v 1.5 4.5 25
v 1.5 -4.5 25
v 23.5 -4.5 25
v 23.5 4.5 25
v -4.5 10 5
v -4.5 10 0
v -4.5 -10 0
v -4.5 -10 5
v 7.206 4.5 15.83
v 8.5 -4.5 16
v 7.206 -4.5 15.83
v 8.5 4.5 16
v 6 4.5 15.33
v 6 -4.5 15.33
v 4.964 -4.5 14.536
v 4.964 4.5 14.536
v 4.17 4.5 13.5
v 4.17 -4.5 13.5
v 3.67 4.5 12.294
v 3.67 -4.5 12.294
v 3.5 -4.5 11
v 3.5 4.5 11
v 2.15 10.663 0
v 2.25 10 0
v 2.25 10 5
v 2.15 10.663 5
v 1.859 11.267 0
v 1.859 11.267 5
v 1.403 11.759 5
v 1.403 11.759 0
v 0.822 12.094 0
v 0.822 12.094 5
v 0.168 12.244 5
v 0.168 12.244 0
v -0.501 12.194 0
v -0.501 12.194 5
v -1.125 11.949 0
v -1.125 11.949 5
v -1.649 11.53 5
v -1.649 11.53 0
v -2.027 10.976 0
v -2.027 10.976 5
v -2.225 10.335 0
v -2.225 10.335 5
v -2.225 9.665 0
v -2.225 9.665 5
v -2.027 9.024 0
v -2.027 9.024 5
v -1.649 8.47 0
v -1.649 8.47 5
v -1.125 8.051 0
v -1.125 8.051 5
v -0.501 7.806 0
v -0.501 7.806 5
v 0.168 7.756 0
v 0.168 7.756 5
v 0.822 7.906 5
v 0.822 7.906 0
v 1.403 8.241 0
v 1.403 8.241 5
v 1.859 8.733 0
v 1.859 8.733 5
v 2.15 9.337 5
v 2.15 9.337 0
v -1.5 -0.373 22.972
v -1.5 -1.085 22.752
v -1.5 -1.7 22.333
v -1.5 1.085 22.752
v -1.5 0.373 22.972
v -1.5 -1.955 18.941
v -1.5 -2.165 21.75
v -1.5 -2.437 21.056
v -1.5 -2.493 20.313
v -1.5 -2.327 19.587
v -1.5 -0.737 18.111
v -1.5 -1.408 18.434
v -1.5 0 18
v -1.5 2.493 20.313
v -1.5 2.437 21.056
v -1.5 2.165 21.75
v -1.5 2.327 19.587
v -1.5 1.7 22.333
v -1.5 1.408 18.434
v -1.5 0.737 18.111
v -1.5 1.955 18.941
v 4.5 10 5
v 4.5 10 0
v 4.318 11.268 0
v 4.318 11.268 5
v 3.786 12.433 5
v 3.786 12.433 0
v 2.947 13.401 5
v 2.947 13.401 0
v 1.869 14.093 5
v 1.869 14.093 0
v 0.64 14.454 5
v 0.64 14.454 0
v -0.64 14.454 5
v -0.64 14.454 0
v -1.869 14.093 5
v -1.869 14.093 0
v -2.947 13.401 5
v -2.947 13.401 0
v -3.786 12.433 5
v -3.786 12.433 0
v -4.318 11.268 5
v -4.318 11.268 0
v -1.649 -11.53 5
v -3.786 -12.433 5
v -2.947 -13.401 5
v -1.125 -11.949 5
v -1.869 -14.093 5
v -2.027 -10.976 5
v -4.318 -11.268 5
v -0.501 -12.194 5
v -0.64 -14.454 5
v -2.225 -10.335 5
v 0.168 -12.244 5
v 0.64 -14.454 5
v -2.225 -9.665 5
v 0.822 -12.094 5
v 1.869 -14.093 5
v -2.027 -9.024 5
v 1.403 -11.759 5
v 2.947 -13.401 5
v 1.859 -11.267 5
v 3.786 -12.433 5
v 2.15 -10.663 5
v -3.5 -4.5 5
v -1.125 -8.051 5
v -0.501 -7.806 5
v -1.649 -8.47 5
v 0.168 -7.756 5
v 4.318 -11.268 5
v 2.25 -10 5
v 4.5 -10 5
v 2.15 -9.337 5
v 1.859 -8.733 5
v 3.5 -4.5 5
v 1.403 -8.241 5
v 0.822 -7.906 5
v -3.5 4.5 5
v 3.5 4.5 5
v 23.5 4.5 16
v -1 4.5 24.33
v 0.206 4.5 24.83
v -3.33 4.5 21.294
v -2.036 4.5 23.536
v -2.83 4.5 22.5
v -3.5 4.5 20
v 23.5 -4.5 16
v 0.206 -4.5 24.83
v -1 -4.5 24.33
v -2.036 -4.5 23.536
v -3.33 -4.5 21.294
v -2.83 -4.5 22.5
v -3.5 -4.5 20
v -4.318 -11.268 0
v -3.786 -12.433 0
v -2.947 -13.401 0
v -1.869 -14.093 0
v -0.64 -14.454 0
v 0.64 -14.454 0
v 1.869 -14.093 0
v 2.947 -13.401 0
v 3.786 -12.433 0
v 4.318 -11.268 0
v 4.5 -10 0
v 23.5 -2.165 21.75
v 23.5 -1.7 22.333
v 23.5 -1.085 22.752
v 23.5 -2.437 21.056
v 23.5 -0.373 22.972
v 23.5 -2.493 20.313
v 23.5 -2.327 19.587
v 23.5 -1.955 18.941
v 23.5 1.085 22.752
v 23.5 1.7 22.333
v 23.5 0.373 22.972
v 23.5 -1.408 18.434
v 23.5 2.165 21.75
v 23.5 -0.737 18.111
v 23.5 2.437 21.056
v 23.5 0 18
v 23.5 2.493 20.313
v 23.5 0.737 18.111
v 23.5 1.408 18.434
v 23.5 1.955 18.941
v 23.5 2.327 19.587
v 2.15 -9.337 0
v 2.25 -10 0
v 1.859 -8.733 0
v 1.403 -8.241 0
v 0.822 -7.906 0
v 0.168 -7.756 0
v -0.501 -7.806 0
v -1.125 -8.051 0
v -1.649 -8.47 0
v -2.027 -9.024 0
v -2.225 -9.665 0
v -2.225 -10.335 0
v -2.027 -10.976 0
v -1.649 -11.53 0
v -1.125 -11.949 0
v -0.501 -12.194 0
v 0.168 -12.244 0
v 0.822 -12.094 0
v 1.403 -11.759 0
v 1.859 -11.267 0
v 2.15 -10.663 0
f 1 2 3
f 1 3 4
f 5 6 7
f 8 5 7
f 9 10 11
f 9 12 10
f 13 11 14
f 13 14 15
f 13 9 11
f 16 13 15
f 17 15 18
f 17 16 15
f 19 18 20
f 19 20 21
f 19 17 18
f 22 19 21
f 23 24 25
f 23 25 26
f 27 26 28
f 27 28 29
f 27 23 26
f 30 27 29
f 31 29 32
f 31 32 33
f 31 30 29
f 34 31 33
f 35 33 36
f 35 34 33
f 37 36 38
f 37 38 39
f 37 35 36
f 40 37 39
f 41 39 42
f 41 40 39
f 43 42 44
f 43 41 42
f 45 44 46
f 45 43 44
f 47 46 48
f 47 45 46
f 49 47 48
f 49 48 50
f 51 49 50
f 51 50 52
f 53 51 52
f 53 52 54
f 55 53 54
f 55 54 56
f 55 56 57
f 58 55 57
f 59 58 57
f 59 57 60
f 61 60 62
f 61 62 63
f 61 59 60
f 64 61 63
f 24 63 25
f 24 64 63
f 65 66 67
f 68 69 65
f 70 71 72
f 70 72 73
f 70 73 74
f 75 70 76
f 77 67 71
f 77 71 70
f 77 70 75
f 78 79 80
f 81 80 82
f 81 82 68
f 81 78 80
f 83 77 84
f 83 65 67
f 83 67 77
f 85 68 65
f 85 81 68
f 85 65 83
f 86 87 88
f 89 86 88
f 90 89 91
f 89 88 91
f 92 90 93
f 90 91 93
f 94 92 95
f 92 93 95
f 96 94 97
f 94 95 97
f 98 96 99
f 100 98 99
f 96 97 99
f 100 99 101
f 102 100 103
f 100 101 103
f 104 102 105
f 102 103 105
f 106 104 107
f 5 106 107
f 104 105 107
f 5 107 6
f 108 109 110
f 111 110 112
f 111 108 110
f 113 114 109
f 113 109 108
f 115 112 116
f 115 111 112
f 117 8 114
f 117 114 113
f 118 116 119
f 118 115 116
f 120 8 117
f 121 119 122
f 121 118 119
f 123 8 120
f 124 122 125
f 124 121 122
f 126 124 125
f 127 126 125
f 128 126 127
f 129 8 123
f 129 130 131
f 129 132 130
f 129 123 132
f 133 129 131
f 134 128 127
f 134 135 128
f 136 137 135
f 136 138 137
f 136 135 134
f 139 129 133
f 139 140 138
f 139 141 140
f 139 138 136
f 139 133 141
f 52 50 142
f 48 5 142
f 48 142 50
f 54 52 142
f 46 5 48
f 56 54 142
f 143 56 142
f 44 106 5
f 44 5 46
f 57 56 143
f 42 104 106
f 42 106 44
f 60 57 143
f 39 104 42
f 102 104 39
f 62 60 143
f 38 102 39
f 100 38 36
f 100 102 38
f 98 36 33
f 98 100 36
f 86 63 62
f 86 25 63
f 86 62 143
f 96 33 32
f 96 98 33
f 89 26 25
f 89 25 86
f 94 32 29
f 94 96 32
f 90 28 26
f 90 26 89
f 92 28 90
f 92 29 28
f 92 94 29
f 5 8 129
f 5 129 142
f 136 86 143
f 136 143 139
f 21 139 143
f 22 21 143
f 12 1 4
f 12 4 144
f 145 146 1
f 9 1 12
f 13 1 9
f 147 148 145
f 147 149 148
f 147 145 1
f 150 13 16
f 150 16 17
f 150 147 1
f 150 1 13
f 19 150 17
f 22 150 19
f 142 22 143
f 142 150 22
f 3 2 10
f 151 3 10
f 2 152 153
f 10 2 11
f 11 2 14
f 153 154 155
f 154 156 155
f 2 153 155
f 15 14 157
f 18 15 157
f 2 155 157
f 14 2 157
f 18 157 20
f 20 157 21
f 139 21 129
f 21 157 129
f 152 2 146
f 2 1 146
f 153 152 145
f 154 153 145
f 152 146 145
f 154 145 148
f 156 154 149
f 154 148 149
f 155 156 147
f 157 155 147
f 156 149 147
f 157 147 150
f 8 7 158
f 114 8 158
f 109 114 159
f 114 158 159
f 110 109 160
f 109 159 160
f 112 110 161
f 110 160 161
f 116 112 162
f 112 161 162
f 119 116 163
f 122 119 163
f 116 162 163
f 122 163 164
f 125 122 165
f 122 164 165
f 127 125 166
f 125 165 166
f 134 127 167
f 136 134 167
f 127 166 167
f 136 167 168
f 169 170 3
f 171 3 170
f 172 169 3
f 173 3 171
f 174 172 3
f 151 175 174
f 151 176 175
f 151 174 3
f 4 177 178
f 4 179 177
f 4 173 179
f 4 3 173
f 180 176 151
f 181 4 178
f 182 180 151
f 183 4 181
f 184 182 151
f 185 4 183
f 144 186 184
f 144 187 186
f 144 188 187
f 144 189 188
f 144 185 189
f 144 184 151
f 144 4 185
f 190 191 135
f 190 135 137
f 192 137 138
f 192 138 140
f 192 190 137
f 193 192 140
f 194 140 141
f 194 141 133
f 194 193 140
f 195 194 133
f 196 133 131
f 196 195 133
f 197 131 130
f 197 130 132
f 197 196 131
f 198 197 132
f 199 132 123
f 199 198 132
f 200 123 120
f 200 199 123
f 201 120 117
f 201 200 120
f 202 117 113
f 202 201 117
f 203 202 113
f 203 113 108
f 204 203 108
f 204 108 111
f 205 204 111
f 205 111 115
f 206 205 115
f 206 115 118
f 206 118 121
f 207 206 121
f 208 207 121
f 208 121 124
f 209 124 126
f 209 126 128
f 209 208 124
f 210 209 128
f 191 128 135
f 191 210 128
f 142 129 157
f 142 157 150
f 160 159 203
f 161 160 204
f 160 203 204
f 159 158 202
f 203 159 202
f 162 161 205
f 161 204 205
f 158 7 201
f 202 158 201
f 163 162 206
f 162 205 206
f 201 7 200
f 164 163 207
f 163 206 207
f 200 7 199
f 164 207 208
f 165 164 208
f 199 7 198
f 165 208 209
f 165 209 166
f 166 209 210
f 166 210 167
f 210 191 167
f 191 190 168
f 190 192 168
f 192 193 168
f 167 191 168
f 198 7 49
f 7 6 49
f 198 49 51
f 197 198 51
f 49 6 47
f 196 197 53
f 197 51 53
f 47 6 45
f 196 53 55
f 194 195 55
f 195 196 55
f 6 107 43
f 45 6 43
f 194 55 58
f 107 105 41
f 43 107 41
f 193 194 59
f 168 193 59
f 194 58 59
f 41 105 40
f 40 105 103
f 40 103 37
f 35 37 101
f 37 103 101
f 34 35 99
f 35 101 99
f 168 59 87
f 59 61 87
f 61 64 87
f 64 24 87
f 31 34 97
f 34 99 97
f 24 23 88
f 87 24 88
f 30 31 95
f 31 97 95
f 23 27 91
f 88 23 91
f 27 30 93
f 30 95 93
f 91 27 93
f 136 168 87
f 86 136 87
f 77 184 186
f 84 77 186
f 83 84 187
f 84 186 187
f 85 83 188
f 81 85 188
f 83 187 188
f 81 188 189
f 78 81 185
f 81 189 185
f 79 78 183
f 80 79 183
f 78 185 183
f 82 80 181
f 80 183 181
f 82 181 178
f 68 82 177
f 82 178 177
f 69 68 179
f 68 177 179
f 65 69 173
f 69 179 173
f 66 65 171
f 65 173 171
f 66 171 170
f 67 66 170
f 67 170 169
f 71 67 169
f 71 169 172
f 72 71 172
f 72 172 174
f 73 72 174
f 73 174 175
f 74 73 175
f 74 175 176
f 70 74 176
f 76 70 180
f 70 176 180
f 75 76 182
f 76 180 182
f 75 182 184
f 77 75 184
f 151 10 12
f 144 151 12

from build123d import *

# Parameters (mm, degrees)
SKETCH1_R           = 2.25
BOSS_EXTRUDE1_DEPTH = 5
SKETCH2_W           = 7
SKETCH2_H           = 9
BOSS_EXTRUDE2_DEPTH = 20
SKETCH4_W           = 9
SKETCH4_H           = 9
BOSS_EXTRUDE4_DEPTH = 20
SKETCH5_R           = 2.5
CUT_EXTRUDE1_DEPTH  = 25
FILLET1_R           = 5
FILLET2_R           = 5


with BuildPart() as part:
    # Sketch1 → Boss-Extrude1 (new body)
    with BuildSketch(Plane.XY):
        with BuildLine():
            ThreePointArc((4.5, 10), (0, 14.5), (-4.5, 10))
            Line((-4.5, 10), (-4.5, -10))
            ThreePointArc((-4.5, -10), (0, -14.5), (4.5, -10))
            Line((4.5, -10), (4.5, 10))
        make_face()
        with Locations((0, 10)):
            Circle(SKETCH1_R, mode=Mode.SUBTRACT)
        with Locations((0, -10)):
            Circle(SKETCH1_R, mode=Mode.SUBTRACT)
    extrude(amount=BOSS_EXTRUDE1_DEPTH)

    # Sketch2 → Boss-Extrude2 (add)
    with BuildSketch(Plane.XY.offset(5)):
        Rectangle(SKETCH2_W, SKETCH2_H)
    extrude(amount=BOSS_EXTRUDE2_DEPTH)

    # Sketch4 → Boss-Extrude4 (add)
    with BuildSketch(Plane(origin=(3.5, 0, 0), x_dir=(0, 0, -1), z_dir=(1, 0, 0))):
        with Locations((-20.5, 0)):
            Rectangle(SKETCH4_W, SKETCH4_H)
    extrude(amount=BOSS_EXTRUDE4_DEPTH)

    # Sketch5 → Cut-Extrude1 (cut)
    with BuildSketch(Plane(origin=(23.5, 0, 0), x_dir=(0, 0, -1), z_dir=(1, 0, 0))):
        with Locations((-20.5, 0)):
            Circle(SKETCH5_R)
    extrude(amount=-CUT_EXTRUDE1_DEPTH, mode=Mode.SUBTRACT)

    # Fillet1
    fillet1_edges = [part.edges().sort_by_distance(p)[0] for p in [
        (3.5, 0, 16),
    ]]
    fillet(fillet1_edges, radius=FILLET1_R)

    # Fillet2
    fillet2_edges = [part.edges().sort_by_distance(p)[0] for p in [
        (-3.5, 0, 25),
    ]]
    fillet(fillet2_edges, radius=FILLET2_R)


solid = part.part
